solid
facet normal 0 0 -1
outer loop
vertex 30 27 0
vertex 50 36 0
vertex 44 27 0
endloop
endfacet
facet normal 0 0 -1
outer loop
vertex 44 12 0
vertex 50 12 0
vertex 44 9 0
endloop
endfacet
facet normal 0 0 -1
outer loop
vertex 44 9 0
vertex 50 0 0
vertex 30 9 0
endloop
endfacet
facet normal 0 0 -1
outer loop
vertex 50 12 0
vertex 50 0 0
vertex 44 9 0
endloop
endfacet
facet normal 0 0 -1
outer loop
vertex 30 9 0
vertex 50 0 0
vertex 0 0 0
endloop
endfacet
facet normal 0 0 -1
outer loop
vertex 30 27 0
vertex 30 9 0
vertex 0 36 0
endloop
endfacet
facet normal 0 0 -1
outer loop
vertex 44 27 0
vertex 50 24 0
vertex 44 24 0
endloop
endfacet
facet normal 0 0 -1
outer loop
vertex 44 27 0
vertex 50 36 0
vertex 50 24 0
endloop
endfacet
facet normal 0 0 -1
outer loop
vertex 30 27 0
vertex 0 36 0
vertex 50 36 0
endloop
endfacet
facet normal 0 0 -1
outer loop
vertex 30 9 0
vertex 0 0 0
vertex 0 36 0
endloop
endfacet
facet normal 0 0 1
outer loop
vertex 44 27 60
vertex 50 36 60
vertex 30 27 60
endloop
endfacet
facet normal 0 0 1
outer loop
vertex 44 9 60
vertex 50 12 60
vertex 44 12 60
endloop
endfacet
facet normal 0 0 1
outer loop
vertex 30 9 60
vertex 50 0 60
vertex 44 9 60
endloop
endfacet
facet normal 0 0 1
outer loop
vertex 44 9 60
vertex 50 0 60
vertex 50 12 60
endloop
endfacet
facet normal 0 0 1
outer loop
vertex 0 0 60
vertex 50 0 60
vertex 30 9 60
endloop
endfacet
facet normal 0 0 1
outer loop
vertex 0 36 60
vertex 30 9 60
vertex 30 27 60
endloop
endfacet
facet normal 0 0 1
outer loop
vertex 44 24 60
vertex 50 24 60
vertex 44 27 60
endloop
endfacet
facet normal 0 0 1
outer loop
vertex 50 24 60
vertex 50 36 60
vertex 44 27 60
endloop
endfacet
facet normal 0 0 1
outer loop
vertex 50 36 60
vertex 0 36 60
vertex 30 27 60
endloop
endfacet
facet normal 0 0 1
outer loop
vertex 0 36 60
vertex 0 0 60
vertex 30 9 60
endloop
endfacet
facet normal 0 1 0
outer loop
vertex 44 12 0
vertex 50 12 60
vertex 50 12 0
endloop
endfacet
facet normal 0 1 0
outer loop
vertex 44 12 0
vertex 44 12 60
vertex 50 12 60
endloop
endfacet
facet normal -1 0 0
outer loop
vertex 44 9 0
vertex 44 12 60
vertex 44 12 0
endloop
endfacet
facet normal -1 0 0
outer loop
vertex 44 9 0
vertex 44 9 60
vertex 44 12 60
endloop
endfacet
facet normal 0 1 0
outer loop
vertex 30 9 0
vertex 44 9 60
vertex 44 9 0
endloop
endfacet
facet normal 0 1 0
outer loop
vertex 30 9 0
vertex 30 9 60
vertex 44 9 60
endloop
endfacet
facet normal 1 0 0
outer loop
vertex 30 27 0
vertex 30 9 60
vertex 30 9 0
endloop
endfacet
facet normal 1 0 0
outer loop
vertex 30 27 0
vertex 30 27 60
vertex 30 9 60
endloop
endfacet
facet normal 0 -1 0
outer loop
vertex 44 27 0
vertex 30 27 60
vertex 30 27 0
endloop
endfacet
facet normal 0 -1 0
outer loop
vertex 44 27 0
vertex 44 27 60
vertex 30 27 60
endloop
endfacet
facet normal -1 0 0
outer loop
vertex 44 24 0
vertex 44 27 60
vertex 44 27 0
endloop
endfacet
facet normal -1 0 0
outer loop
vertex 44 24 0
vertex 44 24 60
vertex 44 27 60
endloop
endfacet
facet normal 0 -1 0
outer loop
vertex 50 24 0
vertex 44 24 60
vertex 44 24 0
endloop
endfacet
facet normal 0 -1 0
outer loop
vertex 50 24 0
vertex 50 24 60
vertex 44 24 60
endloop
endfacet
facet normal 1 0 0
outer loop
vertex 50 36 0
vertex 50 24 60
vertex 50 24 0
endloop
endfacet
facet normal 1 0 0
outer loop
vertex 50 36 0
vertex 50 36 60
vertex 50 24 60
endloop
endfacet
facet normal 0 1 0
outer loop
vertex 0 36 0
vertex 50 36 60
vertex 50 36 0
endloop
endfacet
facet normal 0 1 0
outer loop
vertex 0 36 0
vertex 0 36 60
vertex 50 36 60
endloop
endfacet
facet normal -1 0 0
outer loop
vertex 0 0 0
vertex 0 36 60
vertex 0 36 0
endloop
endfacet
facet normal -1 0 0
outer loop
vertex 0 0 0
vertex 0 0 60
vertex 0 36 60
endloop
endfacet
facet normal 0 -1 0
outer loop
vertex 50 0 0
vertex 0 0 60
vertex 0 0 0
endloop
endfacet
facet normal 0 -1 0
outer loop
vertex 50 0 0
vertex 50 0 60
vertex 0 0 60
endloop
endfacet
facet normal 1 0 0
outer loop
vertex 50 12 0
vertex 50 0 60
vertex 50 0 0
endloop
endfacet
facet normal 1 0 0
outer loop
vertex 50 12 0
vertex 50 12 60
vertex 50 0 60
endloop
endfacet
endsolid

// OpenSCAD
$fn = 32;

// ----------------------------------------------------------------------
// T-slot rail: 50 x 36 mm section, 60 mm long
// ----------------------------------------------------------------------

// --- parameters (mm) ---
profile_height = 60;      // extrusion height
profile_points = 12;      // points of the closed outline

profile = [[0, 0], [50, 0], [50, 12], [44, 12], [44, 9], [30, 9], [30, 27], [44, 27], [44, 24], [50, 24], [50, 36], [0, 36]];  // single closed polygon, 12 points, counter clockwise

// --- the one profile operation ---
linear_extrude(height = profile_height) polygon(points = profile);
